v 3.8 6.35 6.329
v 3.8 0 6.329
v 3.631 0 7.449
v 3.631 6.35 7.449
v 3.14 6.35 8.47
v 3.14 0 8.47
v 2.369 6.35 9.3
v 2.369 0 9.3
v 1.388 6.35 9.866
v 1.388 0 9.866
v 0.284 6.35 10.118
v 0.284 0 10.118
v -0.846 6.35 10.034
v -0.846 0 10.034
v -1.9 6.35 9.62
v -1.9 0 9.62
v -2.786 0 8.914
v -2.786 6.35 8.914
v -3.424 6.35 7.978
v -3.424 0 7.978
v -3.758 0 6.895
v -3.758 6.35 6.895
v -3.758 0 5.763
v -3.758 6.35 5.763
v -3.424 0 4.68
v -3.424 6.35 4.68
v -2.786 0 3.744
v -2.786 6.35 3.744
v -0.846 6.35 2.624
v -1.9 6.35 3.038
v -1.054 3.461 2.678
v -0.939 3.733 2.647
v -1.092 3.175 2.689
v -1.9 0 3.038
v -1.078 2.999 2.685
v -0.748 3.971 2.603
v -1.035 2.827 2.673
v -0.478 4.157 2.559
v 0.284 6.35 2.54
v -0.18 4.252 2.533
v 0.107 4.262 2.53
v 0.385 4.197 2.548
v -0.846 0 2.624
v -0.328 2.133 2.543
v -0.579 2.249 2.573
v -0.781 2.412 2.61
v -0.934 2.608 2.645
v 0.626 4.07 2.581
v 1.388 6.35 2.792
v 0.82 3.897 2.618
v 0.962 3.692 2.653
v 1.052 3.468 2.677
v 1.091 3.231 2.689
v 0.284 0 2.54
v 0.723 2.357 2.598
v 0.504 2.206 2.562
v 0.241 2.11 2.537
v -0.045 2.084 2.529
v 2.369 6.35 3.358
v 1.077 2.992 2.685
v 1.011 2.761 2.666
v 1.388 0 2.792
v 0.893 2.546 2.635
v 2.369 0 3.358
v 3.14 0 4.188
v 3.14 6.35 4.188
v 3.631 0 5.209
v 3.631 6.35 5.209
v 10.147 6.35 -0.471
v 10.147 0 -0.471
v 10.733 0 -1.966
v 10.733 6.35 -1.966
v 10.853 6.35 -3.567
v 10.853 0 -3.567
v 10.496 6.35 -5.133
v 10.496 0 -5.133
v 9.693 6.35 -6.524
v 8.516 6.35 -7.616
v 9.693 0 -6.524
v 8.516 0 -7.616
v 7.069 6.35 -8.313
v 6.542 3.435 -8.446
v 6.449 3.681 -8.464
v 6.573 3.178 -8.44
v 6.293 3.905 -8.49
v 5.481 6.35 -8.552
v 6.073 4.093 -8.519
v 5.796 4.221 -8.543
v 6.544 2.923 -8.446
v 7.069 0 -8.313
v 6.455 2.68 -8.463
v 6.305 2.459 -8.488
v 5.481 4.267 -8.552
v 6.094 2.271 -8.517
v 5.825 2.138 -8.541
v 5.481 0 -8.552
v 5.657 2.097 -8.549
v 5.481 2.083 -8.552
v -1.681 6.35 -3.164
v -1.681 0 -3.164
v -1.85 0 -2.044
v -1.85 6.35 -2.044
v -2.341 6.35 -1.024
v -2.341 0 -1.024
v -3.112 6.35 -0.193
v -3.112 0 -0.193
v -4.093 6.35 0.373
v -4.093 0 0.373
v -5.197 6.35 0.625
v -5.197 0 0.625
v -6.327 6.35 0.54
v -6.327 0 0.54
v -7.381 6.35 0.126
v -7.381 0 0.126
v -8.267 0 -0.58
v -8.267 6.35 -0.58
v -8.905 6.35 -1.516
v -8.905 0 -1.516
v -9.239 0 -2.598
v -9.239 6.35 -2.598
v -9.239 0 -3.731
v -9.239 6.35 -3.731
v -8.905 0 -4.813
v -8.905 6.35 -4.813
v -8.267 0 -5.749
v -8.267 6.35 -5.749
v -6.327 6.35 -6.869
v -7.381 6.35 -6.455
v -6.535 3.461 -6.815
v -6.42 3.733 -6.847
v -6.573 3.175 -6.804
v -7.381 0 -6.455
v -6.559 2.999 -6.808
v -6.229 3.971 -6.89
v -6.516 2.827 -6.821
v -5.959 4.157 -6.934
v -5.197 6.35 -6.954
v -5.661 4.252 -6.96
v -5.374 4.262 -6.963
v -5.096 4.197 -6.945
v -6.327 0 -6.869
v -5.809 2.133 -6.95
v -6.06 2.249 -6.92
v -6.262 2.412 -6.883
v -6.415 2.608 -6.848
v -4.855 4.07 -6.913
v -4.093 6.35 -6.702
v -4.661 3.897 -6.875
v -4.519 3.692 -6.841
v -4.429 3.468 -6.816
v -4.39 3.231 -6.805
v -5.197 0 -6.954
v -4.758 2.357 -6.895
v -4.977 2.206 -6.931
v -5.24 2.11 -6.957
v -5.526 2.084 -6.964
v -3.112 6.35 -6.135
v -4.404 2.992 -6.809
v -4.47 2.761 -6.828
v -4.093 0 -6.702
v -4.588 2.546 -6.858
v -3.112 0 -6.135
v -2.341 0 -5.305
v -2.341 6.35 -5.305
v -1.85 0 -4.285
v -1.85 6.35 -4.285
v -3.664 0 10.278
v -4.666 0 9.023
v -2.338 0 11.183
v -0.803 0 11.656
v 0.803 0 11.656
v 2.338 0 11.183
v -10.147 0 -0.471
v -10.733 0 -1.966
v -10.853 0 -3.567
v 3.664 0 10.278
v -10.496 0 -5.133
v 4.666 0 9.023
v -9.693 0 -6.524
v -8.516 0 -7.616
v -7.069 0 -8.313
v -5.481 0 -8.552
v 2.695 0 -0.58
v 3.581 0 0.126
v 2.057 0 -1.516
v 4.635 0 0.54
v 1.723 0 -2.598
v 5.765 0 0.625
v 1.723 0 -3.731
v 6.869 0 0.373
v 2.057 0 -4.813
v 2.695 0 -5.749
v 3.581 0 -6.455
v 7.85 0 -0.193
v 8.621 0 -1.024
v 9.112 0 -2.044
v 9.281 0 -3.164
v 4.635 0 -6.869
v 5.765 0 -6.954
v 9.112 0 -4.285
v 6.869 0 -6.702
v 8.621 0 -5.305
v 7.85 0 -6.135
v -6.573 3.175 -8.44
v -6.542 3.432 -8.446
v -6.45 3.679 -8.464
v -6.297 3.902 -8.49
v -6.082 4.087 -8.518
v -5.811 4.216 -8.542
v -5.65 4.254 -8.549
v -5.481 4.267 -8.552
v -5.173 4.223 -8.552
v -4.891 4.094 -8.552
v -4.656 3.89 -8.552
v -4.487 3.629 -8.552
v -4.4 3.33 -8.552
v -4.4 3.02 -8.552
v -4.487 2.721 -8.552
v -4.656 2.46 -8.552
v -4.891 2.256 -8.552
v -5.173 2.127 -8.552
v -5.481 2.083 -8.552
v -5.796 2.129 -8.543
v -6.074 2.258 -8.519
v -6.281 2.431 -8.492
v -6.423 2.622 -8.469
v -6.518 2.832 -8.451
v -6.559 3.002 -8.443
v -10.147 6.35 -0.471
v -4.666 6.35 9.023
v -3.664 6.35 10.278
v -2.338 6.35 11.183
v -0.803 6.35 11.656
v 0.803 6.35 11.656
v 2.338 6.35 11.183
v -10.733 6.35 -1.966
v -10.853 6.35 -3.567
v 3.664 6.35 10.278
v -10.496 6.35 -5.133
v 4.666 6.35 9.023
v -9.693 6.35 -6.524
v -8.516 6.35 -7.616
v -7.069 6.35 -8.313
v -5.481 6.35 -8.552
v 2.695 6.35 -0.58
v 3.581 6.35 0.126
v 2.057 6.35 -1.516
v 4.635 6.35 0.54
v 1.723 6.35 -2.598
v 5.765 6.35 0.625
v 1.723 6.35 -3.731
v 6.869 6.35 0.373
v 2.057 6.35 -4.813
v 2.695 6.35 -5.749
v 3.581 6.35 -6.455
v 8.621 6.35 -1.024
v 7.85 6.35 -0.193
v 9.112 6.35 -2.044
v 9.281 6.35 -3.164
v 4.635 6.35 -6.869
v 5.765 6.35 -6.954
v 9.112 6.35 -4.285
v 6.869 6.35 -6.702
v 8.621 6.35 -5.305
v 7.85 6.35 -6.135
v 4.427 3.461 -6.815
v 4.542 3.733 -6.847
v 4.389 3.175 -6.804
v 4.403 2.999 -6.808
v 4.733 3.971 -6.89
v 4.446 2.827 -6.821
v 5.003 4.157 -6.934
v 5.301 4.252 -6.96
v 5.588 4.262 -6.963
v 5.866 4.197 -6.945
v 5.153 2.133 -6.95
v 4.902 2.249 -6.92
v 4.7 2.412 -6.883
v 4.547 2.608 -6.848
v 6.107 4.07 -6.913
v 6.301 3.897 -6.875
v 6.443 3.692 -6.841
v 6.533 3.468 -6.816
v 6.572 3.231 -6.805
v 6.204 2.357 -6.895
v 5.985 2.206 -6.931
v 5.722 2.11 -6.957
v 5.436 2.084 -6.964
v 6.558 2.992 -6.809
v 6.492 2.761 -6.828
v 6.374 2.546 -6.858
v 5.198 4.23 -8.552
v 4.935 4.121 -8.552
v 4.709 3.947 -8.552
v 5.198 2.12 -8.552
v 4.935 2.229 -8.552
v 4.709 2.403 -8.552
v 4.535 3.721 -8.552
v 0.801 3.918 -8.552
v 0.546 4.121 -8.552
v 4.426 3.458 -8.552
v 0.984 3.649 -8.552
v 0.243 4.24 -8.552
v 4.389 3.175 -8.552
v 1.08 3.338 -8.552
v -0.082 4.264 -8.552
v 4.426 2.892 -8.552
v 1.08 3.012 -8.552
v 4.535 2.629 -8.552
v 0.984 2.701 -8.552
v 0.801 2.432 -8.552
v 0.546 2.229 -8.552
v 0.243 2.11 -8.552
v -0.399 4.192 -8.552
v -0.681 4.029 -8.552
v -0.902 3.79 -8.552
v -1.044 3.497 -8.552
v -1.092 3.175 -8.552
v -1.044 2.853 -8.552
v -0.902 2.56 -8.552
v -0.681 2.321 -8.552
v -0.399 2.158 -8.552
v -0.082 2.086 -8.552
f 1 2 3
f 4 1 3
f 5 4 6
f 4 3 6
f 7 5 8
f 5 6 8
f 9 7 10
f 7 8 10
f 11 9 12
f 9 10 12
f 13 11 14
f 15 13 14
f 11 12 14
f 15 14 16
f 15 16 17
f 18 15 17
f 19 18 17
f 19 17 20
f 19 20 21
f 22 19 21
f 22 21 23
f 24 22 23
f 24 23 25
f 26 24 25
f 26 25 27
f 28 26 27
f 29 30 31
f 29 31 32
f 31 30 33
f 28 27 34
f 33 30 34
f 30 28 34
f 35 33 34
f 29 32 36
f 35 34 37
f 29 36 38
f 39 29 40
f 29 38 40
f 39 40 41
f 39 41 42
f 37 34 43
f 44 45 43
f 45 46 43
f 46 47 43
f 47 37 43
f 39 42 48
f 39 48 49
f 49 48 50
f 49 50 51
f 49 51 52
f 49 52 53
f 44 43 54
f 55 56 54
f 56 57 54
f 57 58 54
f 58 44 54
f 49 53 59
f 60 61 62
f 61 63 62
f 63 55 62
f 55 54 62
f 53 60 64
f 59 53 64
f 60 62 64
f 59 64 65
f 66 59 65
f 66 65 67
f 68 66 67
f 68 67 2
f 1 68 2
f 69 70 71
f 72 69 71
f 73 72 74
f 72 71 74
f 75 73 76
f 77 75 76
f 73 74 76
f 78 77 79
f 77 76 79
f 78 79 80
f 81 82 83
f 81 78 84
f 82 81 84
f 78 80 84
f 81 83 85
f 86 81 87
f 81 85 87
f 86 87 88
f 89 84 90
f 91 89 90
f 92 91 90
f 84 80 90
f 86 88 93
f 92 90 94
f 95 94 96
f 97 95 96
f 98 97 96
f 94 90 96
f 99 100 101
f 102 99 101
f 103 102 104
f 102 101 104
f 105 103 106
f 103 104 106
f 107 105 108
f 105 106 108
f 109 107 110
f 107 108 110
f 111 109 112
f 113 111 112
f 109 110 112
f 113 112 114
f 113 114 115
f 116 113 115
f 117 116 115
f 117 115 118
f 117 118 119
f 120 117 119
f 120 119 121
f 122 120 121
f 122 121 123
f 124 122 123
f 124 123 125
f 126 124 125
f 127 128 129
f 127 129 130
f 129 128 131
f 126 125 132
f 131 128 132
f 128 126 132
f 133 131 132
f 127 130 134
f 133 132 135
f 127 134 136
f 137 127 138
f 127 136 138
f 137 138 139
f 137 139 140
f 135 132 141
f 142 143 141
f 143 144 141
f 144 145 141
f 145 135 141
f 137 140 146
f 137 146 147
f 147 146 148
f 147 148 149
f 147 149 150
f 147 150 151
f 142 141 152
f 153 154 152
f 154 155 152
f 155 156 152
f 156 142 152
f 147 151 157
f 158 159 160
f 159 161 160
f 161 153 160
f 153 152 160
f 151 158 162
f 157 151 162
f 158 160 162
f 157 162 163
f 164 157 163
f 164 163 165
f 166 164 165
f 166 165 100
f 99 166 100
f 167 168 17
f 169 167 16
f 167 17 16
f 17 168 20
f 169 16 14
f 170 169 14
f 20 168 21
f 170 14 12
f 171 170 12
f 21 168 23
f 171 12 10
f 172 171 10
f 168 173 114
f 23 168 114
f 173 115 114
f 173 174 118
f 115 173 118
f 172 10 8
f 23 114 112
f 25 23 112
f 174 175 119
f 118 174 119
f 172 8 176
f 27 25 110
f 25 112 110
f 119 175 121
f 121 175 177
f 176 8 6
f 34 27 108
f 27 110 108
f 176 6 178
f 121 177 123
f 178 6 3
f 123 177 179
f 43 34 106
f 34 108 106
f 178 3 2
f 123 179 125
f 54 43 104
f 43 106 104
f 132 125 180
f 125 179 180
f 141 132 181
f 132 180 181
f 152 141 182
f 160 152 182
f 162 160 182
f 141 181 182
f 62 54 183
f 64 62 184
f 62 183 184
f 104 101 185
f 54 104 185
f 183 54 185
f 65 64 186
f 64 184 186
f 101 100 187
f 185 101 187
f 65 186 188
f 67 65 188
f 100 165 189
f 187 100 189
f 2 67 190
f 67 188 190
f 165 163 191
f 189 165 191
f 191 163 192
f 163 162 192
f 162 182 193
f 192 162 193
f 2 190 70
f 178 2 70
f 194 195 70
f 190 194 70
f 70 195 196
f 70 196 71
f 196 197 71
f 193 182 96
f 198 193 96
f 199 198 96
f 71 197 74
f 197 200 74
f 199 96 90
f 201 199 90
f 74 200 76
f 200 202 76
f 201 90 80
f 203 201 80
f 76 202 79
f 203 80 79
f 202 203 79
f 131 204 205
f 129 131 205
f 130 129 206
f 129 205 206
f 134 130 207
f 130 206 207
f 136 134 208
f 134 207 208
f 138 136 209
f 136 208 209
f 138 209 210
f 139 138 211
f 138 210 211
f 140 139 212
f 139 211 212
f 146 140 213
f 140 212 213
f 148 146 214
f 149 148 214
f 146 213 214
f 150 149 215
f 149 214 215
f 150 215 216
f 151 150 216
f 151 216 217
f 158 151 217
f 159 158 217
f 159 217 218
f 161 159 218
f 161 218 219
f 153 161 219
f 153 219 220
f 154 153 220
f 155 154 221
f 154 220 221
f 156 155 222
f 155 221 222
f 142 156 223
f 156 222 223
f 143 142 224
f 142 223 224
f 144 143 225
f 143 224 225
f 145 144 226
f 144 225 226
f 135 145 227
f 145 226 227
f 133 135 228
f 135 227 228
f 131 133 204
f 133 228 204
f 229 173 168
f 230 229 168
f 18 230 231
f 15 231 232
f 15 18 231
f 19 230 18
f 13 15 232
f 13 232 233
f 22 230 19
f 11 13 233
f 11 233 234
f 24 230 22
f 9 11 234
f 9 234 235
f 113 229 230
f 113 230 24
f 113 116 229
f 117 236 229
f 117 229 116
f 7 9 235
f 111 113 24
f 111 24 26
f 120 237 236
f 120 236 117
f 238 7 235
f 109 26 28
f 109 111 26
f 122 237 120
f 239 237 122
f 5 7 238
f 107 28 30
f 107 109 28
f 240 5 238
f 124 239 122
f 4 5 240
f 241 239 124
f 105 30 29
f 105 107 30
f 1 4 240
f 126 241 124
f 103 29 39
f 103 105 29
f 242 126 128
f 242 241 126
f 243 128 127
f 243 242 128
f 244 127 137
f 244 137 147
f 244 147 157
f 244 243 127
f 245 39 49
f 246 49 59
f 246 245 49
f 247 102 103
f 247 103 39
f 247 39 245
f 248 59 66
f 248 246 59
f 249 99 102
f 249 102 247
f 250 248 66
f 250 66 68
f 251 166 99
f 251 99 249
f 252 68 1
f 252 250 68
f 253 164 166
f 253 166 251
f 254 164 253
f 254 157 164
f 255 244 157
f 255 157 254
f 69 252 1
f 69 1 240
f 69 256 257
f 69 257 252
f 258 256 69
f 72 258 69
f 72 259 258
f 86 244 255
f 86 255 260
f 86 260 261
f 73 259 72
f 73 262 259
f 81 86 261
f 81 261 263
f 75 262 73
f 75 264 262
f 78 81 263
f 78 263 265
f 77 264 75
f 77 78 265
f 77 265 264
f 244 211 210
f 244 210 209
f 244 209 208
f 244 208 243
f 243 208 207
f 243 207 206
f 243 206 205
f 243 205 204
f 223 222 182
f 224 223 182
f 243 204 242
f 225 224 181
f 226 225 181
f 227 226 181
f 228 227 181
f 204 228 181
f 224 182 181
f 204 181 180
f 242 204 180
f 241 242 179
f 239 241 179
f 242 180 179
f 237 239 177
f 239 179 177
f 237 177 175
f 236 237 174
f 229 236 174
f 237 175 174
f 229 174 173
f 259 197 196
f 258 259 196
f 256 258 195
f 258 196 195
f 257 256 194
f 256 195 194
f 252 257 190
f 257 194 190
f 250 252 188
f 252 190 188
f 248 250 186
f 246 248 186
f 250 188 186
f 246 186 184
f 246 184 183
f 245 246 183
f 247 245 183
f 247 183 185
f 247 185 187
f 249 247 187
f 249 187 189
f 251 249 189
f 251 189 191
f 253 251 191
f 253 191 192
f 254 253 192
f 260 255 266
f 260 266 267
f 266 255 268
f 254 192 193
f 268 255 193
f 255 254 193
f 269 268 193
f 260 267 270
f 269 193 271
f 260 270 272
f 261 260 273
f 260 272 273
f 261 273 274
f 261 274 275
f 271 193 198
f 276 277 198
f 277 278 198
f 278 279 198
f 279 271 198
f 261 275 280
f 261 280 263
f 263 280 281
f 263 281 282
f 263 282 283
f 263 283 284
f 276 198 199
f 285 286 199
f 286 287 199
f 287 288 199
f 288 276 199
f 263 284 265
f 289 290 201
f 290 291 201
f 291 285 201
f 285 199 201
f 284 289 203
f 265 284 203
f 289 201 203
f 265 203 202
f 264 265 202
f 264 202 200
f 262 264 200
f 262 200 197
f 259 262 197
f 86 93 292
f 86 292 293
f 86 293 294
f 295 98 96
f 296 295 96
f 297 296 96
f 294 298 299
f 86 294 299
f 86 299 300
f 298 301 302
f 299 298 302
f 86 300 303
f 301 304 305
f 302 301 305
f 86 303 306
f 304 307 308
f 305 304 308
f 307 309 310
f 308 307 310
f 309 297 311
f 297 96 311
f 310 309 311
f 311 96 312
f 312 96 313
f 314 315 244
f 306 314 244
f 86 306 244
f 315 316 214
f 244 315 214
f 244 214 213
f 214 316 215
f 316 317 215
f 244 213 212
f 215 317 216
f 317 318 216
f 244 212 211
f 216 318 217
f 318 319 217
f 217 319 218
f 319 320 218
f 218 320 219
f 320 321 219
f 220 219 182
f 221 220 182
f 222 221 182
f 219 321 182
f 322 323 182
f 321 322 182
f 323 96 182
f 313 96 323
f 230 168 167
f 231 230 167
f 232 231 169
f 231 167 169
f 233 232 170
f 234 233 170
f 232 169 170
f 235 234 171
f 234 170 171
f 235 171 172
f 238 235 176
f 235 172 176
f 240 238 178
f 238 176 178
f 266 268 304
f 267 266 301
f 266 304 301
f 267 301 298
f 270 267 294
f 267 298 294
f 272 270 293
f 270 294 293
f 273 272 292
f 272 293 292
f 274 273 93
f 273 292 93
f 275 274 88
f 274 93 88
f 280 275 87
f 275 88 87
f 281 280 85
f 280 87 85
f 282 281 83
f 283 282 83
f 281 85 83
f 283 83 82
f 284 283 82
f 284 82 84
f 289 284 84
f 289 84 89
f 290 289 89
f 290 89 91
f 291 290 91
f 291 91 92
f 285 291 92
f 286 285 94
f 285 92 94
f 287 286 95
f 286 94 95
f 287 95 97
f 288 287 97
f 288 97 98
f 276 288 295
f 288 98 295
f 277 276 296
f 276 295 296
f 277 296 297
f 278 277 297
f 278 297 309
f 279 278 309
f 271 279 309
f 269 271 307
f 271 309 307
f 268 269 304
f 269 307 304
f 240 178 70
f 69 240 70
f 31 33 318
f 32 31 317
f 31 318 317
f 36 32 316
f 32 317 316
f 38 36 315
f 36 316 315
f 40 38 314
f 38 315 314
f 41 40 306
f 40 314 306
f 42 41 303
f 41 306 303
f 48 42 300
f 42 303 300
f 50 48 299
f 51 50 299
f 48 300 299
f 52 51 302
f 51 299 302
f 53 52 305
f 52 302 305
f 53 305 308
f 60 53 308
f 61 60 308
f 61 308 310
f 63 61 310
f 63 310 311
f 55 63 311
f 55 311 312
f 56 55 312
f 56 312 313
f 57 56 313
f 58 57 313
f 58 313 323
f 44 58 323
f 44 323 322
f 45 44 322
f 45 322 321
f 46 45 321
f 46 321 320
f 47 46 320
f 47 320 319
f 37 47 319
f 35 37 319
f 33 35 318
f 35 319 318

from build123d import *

# Parameters (mm, degrees)
SKETCH1_W                       = 63.925633075
SKETCH1_H                       = 55.87744186
EXTRUDE1_DEPTH                  = 6.35
SKETCH2_OUTSIDE_W               = 82.953
SKETCH2_OUTSIDE_H               = 74.905
SKETCH2_OUTSIDE_R               = 3.8
CUT_EXTRUDE1_DEPTH              = 6.35
F_2_56_TAPPED_HOLE1_D           = 1.778
F_2_56_TAPPED_HOLE1_DEPTH       = 5.588
F_2_56_TAPPED_HOLE1_CBORE_D     = 2.1844
F_2_56_TAPPED_HOLE1_CBORE_DEPTH = 4.318
F_2_56_TAPPED_HOLE1_TIP         = 0.53416509
F_2_56_TAPPED_HOLE2_D           = 1.778
F_2_56_TAPPED_HOLE2_DEPTH       = 13.208
F_2_56_TAPPED_HOLE2_CBORE_D     = 2.1844
F_2_56_TAPPED_HOLE2_CBORE_DEPTH = 11.938
F_2_56_TAPPED_HOLE2_TIP         = 0.53416509


with BuildPart() as part:
    # Sketch1 → Extrude1 (new body)
    with BuildSketch(Plane(origin=(0, 0, 0), x_dir=(1, 0, 0), z_dir=(0, 1, 0))):
        with Locations((1.954560723, 3.334250646)):
            Rectangle(SKETCH1_W, SKETCH1_H)
    extrude(amount=EXTRUDE1_DEPTH)

    # Sketch2 outside → Cut-Extrude1 (cut)
    with BuildSketch(Plane.XZ):
        with Locations((1.9545, -3.3345)):
            Rectangle(SKETCH2_OUTSIDE_W, SKETCH2_OUTSIDE_H)
        with BuildLine():
            Line((-10.146711863, -0.470706825), (-4.665711863, 9.022663651))
            ThreePointArc((-4.665711863, 9.022663651), (0, 11.716413651), (4.665711863, 9.022663651))
            Line((4.665711863, 9.022663651), (10.146711863, -0.470706825))
            ThreePointArc((10.146711863, -0.470706825), (10.146711863, -5.858206825), (5.481, -8.551956825))
            Line((5.481, -8.551956825), (-5.481, -8.551956825))
            ThreePointArc((-5.481, -8.551956825), (-10.146711863, -5.858206825), (-10.146711863, -0.470706825))
        make_face(mode=Mode.SUBTRACT)
        with Locations((0, 6.328913651)):
            Circle(SKETCH2_OUTSIDE_R)
        with Locations((5.481, -3.164456825)):
            Circle(SKETCH2_OUTSIDE_R)
        with Locations((-5.481, -3.164456825)):
            Circle(SKETCH2_OUTSIDE_R)
    extrude(amount=-CUT_EXTRUDE1_DEPTH, mode=Mode.SUBTRACT)

    # #2-56 Tapped Hole1
    with Locations(Plane(origin=(5.481, 3.175, -8.551956825), x_dir=(-1, 0, 0), z_dir=(0, 0, -1))):
        with Locations((0, 0), (10.962, 0)):
            CounterBoreHole(F_2_56_TAPPED_HOLE1_D / 2, F_2_56_TAPPED_HOLE1_CBORE_D / 2, F_2_56_TAPPED_HOLE1_CBORE_DEPTH, depth=F_2_56_TAPPED_HOLE1_DEPTH)
            with Locations((0, 0, -(F_2_56_TAPPED_HOLE1_DEPTH + F_2_56_TAPPED_HOLE1_TIP / 2))):  # 118° drill point
                Cone(0, F_2_56_TAPPED_HOLE1_D / 2, F_2_56_TAPPED_HOLE1_TIP, mode=Mode.SUBTRACT)

    # #2-56 Tapped Hole2
    with Locations(Plane(origin=(0, 3.175, -8.551956825), x_dir=(-1, 0, 0), z_dir=(0, 0, -1))):
        with Locations((0, 0)):
            CounterBoreHole(F_2_56_TAPPED_HOLE2_D / 2, F_2_56_TAPPED_HOLE2_CBORE_D / 2, F_2_56_TAPPED_HOLE2_CBORE_DEPTH, depth=F_2_56_TAPPED_HOLE2_DEPTH)
            with Locations((0, 0, -(F_2_56_TAPPED_HOLE2_DEPTH + F_2_56_TAPPED_HOLE2_TIP / 2))):  # 118° drill point
                Cone(0, F_2_56_TAPPED_HOLE2_D / 2, F_2_56_TAPPED_HOLE2_TIP, mode=Mode.SUBTRACT)


solid = part.part
